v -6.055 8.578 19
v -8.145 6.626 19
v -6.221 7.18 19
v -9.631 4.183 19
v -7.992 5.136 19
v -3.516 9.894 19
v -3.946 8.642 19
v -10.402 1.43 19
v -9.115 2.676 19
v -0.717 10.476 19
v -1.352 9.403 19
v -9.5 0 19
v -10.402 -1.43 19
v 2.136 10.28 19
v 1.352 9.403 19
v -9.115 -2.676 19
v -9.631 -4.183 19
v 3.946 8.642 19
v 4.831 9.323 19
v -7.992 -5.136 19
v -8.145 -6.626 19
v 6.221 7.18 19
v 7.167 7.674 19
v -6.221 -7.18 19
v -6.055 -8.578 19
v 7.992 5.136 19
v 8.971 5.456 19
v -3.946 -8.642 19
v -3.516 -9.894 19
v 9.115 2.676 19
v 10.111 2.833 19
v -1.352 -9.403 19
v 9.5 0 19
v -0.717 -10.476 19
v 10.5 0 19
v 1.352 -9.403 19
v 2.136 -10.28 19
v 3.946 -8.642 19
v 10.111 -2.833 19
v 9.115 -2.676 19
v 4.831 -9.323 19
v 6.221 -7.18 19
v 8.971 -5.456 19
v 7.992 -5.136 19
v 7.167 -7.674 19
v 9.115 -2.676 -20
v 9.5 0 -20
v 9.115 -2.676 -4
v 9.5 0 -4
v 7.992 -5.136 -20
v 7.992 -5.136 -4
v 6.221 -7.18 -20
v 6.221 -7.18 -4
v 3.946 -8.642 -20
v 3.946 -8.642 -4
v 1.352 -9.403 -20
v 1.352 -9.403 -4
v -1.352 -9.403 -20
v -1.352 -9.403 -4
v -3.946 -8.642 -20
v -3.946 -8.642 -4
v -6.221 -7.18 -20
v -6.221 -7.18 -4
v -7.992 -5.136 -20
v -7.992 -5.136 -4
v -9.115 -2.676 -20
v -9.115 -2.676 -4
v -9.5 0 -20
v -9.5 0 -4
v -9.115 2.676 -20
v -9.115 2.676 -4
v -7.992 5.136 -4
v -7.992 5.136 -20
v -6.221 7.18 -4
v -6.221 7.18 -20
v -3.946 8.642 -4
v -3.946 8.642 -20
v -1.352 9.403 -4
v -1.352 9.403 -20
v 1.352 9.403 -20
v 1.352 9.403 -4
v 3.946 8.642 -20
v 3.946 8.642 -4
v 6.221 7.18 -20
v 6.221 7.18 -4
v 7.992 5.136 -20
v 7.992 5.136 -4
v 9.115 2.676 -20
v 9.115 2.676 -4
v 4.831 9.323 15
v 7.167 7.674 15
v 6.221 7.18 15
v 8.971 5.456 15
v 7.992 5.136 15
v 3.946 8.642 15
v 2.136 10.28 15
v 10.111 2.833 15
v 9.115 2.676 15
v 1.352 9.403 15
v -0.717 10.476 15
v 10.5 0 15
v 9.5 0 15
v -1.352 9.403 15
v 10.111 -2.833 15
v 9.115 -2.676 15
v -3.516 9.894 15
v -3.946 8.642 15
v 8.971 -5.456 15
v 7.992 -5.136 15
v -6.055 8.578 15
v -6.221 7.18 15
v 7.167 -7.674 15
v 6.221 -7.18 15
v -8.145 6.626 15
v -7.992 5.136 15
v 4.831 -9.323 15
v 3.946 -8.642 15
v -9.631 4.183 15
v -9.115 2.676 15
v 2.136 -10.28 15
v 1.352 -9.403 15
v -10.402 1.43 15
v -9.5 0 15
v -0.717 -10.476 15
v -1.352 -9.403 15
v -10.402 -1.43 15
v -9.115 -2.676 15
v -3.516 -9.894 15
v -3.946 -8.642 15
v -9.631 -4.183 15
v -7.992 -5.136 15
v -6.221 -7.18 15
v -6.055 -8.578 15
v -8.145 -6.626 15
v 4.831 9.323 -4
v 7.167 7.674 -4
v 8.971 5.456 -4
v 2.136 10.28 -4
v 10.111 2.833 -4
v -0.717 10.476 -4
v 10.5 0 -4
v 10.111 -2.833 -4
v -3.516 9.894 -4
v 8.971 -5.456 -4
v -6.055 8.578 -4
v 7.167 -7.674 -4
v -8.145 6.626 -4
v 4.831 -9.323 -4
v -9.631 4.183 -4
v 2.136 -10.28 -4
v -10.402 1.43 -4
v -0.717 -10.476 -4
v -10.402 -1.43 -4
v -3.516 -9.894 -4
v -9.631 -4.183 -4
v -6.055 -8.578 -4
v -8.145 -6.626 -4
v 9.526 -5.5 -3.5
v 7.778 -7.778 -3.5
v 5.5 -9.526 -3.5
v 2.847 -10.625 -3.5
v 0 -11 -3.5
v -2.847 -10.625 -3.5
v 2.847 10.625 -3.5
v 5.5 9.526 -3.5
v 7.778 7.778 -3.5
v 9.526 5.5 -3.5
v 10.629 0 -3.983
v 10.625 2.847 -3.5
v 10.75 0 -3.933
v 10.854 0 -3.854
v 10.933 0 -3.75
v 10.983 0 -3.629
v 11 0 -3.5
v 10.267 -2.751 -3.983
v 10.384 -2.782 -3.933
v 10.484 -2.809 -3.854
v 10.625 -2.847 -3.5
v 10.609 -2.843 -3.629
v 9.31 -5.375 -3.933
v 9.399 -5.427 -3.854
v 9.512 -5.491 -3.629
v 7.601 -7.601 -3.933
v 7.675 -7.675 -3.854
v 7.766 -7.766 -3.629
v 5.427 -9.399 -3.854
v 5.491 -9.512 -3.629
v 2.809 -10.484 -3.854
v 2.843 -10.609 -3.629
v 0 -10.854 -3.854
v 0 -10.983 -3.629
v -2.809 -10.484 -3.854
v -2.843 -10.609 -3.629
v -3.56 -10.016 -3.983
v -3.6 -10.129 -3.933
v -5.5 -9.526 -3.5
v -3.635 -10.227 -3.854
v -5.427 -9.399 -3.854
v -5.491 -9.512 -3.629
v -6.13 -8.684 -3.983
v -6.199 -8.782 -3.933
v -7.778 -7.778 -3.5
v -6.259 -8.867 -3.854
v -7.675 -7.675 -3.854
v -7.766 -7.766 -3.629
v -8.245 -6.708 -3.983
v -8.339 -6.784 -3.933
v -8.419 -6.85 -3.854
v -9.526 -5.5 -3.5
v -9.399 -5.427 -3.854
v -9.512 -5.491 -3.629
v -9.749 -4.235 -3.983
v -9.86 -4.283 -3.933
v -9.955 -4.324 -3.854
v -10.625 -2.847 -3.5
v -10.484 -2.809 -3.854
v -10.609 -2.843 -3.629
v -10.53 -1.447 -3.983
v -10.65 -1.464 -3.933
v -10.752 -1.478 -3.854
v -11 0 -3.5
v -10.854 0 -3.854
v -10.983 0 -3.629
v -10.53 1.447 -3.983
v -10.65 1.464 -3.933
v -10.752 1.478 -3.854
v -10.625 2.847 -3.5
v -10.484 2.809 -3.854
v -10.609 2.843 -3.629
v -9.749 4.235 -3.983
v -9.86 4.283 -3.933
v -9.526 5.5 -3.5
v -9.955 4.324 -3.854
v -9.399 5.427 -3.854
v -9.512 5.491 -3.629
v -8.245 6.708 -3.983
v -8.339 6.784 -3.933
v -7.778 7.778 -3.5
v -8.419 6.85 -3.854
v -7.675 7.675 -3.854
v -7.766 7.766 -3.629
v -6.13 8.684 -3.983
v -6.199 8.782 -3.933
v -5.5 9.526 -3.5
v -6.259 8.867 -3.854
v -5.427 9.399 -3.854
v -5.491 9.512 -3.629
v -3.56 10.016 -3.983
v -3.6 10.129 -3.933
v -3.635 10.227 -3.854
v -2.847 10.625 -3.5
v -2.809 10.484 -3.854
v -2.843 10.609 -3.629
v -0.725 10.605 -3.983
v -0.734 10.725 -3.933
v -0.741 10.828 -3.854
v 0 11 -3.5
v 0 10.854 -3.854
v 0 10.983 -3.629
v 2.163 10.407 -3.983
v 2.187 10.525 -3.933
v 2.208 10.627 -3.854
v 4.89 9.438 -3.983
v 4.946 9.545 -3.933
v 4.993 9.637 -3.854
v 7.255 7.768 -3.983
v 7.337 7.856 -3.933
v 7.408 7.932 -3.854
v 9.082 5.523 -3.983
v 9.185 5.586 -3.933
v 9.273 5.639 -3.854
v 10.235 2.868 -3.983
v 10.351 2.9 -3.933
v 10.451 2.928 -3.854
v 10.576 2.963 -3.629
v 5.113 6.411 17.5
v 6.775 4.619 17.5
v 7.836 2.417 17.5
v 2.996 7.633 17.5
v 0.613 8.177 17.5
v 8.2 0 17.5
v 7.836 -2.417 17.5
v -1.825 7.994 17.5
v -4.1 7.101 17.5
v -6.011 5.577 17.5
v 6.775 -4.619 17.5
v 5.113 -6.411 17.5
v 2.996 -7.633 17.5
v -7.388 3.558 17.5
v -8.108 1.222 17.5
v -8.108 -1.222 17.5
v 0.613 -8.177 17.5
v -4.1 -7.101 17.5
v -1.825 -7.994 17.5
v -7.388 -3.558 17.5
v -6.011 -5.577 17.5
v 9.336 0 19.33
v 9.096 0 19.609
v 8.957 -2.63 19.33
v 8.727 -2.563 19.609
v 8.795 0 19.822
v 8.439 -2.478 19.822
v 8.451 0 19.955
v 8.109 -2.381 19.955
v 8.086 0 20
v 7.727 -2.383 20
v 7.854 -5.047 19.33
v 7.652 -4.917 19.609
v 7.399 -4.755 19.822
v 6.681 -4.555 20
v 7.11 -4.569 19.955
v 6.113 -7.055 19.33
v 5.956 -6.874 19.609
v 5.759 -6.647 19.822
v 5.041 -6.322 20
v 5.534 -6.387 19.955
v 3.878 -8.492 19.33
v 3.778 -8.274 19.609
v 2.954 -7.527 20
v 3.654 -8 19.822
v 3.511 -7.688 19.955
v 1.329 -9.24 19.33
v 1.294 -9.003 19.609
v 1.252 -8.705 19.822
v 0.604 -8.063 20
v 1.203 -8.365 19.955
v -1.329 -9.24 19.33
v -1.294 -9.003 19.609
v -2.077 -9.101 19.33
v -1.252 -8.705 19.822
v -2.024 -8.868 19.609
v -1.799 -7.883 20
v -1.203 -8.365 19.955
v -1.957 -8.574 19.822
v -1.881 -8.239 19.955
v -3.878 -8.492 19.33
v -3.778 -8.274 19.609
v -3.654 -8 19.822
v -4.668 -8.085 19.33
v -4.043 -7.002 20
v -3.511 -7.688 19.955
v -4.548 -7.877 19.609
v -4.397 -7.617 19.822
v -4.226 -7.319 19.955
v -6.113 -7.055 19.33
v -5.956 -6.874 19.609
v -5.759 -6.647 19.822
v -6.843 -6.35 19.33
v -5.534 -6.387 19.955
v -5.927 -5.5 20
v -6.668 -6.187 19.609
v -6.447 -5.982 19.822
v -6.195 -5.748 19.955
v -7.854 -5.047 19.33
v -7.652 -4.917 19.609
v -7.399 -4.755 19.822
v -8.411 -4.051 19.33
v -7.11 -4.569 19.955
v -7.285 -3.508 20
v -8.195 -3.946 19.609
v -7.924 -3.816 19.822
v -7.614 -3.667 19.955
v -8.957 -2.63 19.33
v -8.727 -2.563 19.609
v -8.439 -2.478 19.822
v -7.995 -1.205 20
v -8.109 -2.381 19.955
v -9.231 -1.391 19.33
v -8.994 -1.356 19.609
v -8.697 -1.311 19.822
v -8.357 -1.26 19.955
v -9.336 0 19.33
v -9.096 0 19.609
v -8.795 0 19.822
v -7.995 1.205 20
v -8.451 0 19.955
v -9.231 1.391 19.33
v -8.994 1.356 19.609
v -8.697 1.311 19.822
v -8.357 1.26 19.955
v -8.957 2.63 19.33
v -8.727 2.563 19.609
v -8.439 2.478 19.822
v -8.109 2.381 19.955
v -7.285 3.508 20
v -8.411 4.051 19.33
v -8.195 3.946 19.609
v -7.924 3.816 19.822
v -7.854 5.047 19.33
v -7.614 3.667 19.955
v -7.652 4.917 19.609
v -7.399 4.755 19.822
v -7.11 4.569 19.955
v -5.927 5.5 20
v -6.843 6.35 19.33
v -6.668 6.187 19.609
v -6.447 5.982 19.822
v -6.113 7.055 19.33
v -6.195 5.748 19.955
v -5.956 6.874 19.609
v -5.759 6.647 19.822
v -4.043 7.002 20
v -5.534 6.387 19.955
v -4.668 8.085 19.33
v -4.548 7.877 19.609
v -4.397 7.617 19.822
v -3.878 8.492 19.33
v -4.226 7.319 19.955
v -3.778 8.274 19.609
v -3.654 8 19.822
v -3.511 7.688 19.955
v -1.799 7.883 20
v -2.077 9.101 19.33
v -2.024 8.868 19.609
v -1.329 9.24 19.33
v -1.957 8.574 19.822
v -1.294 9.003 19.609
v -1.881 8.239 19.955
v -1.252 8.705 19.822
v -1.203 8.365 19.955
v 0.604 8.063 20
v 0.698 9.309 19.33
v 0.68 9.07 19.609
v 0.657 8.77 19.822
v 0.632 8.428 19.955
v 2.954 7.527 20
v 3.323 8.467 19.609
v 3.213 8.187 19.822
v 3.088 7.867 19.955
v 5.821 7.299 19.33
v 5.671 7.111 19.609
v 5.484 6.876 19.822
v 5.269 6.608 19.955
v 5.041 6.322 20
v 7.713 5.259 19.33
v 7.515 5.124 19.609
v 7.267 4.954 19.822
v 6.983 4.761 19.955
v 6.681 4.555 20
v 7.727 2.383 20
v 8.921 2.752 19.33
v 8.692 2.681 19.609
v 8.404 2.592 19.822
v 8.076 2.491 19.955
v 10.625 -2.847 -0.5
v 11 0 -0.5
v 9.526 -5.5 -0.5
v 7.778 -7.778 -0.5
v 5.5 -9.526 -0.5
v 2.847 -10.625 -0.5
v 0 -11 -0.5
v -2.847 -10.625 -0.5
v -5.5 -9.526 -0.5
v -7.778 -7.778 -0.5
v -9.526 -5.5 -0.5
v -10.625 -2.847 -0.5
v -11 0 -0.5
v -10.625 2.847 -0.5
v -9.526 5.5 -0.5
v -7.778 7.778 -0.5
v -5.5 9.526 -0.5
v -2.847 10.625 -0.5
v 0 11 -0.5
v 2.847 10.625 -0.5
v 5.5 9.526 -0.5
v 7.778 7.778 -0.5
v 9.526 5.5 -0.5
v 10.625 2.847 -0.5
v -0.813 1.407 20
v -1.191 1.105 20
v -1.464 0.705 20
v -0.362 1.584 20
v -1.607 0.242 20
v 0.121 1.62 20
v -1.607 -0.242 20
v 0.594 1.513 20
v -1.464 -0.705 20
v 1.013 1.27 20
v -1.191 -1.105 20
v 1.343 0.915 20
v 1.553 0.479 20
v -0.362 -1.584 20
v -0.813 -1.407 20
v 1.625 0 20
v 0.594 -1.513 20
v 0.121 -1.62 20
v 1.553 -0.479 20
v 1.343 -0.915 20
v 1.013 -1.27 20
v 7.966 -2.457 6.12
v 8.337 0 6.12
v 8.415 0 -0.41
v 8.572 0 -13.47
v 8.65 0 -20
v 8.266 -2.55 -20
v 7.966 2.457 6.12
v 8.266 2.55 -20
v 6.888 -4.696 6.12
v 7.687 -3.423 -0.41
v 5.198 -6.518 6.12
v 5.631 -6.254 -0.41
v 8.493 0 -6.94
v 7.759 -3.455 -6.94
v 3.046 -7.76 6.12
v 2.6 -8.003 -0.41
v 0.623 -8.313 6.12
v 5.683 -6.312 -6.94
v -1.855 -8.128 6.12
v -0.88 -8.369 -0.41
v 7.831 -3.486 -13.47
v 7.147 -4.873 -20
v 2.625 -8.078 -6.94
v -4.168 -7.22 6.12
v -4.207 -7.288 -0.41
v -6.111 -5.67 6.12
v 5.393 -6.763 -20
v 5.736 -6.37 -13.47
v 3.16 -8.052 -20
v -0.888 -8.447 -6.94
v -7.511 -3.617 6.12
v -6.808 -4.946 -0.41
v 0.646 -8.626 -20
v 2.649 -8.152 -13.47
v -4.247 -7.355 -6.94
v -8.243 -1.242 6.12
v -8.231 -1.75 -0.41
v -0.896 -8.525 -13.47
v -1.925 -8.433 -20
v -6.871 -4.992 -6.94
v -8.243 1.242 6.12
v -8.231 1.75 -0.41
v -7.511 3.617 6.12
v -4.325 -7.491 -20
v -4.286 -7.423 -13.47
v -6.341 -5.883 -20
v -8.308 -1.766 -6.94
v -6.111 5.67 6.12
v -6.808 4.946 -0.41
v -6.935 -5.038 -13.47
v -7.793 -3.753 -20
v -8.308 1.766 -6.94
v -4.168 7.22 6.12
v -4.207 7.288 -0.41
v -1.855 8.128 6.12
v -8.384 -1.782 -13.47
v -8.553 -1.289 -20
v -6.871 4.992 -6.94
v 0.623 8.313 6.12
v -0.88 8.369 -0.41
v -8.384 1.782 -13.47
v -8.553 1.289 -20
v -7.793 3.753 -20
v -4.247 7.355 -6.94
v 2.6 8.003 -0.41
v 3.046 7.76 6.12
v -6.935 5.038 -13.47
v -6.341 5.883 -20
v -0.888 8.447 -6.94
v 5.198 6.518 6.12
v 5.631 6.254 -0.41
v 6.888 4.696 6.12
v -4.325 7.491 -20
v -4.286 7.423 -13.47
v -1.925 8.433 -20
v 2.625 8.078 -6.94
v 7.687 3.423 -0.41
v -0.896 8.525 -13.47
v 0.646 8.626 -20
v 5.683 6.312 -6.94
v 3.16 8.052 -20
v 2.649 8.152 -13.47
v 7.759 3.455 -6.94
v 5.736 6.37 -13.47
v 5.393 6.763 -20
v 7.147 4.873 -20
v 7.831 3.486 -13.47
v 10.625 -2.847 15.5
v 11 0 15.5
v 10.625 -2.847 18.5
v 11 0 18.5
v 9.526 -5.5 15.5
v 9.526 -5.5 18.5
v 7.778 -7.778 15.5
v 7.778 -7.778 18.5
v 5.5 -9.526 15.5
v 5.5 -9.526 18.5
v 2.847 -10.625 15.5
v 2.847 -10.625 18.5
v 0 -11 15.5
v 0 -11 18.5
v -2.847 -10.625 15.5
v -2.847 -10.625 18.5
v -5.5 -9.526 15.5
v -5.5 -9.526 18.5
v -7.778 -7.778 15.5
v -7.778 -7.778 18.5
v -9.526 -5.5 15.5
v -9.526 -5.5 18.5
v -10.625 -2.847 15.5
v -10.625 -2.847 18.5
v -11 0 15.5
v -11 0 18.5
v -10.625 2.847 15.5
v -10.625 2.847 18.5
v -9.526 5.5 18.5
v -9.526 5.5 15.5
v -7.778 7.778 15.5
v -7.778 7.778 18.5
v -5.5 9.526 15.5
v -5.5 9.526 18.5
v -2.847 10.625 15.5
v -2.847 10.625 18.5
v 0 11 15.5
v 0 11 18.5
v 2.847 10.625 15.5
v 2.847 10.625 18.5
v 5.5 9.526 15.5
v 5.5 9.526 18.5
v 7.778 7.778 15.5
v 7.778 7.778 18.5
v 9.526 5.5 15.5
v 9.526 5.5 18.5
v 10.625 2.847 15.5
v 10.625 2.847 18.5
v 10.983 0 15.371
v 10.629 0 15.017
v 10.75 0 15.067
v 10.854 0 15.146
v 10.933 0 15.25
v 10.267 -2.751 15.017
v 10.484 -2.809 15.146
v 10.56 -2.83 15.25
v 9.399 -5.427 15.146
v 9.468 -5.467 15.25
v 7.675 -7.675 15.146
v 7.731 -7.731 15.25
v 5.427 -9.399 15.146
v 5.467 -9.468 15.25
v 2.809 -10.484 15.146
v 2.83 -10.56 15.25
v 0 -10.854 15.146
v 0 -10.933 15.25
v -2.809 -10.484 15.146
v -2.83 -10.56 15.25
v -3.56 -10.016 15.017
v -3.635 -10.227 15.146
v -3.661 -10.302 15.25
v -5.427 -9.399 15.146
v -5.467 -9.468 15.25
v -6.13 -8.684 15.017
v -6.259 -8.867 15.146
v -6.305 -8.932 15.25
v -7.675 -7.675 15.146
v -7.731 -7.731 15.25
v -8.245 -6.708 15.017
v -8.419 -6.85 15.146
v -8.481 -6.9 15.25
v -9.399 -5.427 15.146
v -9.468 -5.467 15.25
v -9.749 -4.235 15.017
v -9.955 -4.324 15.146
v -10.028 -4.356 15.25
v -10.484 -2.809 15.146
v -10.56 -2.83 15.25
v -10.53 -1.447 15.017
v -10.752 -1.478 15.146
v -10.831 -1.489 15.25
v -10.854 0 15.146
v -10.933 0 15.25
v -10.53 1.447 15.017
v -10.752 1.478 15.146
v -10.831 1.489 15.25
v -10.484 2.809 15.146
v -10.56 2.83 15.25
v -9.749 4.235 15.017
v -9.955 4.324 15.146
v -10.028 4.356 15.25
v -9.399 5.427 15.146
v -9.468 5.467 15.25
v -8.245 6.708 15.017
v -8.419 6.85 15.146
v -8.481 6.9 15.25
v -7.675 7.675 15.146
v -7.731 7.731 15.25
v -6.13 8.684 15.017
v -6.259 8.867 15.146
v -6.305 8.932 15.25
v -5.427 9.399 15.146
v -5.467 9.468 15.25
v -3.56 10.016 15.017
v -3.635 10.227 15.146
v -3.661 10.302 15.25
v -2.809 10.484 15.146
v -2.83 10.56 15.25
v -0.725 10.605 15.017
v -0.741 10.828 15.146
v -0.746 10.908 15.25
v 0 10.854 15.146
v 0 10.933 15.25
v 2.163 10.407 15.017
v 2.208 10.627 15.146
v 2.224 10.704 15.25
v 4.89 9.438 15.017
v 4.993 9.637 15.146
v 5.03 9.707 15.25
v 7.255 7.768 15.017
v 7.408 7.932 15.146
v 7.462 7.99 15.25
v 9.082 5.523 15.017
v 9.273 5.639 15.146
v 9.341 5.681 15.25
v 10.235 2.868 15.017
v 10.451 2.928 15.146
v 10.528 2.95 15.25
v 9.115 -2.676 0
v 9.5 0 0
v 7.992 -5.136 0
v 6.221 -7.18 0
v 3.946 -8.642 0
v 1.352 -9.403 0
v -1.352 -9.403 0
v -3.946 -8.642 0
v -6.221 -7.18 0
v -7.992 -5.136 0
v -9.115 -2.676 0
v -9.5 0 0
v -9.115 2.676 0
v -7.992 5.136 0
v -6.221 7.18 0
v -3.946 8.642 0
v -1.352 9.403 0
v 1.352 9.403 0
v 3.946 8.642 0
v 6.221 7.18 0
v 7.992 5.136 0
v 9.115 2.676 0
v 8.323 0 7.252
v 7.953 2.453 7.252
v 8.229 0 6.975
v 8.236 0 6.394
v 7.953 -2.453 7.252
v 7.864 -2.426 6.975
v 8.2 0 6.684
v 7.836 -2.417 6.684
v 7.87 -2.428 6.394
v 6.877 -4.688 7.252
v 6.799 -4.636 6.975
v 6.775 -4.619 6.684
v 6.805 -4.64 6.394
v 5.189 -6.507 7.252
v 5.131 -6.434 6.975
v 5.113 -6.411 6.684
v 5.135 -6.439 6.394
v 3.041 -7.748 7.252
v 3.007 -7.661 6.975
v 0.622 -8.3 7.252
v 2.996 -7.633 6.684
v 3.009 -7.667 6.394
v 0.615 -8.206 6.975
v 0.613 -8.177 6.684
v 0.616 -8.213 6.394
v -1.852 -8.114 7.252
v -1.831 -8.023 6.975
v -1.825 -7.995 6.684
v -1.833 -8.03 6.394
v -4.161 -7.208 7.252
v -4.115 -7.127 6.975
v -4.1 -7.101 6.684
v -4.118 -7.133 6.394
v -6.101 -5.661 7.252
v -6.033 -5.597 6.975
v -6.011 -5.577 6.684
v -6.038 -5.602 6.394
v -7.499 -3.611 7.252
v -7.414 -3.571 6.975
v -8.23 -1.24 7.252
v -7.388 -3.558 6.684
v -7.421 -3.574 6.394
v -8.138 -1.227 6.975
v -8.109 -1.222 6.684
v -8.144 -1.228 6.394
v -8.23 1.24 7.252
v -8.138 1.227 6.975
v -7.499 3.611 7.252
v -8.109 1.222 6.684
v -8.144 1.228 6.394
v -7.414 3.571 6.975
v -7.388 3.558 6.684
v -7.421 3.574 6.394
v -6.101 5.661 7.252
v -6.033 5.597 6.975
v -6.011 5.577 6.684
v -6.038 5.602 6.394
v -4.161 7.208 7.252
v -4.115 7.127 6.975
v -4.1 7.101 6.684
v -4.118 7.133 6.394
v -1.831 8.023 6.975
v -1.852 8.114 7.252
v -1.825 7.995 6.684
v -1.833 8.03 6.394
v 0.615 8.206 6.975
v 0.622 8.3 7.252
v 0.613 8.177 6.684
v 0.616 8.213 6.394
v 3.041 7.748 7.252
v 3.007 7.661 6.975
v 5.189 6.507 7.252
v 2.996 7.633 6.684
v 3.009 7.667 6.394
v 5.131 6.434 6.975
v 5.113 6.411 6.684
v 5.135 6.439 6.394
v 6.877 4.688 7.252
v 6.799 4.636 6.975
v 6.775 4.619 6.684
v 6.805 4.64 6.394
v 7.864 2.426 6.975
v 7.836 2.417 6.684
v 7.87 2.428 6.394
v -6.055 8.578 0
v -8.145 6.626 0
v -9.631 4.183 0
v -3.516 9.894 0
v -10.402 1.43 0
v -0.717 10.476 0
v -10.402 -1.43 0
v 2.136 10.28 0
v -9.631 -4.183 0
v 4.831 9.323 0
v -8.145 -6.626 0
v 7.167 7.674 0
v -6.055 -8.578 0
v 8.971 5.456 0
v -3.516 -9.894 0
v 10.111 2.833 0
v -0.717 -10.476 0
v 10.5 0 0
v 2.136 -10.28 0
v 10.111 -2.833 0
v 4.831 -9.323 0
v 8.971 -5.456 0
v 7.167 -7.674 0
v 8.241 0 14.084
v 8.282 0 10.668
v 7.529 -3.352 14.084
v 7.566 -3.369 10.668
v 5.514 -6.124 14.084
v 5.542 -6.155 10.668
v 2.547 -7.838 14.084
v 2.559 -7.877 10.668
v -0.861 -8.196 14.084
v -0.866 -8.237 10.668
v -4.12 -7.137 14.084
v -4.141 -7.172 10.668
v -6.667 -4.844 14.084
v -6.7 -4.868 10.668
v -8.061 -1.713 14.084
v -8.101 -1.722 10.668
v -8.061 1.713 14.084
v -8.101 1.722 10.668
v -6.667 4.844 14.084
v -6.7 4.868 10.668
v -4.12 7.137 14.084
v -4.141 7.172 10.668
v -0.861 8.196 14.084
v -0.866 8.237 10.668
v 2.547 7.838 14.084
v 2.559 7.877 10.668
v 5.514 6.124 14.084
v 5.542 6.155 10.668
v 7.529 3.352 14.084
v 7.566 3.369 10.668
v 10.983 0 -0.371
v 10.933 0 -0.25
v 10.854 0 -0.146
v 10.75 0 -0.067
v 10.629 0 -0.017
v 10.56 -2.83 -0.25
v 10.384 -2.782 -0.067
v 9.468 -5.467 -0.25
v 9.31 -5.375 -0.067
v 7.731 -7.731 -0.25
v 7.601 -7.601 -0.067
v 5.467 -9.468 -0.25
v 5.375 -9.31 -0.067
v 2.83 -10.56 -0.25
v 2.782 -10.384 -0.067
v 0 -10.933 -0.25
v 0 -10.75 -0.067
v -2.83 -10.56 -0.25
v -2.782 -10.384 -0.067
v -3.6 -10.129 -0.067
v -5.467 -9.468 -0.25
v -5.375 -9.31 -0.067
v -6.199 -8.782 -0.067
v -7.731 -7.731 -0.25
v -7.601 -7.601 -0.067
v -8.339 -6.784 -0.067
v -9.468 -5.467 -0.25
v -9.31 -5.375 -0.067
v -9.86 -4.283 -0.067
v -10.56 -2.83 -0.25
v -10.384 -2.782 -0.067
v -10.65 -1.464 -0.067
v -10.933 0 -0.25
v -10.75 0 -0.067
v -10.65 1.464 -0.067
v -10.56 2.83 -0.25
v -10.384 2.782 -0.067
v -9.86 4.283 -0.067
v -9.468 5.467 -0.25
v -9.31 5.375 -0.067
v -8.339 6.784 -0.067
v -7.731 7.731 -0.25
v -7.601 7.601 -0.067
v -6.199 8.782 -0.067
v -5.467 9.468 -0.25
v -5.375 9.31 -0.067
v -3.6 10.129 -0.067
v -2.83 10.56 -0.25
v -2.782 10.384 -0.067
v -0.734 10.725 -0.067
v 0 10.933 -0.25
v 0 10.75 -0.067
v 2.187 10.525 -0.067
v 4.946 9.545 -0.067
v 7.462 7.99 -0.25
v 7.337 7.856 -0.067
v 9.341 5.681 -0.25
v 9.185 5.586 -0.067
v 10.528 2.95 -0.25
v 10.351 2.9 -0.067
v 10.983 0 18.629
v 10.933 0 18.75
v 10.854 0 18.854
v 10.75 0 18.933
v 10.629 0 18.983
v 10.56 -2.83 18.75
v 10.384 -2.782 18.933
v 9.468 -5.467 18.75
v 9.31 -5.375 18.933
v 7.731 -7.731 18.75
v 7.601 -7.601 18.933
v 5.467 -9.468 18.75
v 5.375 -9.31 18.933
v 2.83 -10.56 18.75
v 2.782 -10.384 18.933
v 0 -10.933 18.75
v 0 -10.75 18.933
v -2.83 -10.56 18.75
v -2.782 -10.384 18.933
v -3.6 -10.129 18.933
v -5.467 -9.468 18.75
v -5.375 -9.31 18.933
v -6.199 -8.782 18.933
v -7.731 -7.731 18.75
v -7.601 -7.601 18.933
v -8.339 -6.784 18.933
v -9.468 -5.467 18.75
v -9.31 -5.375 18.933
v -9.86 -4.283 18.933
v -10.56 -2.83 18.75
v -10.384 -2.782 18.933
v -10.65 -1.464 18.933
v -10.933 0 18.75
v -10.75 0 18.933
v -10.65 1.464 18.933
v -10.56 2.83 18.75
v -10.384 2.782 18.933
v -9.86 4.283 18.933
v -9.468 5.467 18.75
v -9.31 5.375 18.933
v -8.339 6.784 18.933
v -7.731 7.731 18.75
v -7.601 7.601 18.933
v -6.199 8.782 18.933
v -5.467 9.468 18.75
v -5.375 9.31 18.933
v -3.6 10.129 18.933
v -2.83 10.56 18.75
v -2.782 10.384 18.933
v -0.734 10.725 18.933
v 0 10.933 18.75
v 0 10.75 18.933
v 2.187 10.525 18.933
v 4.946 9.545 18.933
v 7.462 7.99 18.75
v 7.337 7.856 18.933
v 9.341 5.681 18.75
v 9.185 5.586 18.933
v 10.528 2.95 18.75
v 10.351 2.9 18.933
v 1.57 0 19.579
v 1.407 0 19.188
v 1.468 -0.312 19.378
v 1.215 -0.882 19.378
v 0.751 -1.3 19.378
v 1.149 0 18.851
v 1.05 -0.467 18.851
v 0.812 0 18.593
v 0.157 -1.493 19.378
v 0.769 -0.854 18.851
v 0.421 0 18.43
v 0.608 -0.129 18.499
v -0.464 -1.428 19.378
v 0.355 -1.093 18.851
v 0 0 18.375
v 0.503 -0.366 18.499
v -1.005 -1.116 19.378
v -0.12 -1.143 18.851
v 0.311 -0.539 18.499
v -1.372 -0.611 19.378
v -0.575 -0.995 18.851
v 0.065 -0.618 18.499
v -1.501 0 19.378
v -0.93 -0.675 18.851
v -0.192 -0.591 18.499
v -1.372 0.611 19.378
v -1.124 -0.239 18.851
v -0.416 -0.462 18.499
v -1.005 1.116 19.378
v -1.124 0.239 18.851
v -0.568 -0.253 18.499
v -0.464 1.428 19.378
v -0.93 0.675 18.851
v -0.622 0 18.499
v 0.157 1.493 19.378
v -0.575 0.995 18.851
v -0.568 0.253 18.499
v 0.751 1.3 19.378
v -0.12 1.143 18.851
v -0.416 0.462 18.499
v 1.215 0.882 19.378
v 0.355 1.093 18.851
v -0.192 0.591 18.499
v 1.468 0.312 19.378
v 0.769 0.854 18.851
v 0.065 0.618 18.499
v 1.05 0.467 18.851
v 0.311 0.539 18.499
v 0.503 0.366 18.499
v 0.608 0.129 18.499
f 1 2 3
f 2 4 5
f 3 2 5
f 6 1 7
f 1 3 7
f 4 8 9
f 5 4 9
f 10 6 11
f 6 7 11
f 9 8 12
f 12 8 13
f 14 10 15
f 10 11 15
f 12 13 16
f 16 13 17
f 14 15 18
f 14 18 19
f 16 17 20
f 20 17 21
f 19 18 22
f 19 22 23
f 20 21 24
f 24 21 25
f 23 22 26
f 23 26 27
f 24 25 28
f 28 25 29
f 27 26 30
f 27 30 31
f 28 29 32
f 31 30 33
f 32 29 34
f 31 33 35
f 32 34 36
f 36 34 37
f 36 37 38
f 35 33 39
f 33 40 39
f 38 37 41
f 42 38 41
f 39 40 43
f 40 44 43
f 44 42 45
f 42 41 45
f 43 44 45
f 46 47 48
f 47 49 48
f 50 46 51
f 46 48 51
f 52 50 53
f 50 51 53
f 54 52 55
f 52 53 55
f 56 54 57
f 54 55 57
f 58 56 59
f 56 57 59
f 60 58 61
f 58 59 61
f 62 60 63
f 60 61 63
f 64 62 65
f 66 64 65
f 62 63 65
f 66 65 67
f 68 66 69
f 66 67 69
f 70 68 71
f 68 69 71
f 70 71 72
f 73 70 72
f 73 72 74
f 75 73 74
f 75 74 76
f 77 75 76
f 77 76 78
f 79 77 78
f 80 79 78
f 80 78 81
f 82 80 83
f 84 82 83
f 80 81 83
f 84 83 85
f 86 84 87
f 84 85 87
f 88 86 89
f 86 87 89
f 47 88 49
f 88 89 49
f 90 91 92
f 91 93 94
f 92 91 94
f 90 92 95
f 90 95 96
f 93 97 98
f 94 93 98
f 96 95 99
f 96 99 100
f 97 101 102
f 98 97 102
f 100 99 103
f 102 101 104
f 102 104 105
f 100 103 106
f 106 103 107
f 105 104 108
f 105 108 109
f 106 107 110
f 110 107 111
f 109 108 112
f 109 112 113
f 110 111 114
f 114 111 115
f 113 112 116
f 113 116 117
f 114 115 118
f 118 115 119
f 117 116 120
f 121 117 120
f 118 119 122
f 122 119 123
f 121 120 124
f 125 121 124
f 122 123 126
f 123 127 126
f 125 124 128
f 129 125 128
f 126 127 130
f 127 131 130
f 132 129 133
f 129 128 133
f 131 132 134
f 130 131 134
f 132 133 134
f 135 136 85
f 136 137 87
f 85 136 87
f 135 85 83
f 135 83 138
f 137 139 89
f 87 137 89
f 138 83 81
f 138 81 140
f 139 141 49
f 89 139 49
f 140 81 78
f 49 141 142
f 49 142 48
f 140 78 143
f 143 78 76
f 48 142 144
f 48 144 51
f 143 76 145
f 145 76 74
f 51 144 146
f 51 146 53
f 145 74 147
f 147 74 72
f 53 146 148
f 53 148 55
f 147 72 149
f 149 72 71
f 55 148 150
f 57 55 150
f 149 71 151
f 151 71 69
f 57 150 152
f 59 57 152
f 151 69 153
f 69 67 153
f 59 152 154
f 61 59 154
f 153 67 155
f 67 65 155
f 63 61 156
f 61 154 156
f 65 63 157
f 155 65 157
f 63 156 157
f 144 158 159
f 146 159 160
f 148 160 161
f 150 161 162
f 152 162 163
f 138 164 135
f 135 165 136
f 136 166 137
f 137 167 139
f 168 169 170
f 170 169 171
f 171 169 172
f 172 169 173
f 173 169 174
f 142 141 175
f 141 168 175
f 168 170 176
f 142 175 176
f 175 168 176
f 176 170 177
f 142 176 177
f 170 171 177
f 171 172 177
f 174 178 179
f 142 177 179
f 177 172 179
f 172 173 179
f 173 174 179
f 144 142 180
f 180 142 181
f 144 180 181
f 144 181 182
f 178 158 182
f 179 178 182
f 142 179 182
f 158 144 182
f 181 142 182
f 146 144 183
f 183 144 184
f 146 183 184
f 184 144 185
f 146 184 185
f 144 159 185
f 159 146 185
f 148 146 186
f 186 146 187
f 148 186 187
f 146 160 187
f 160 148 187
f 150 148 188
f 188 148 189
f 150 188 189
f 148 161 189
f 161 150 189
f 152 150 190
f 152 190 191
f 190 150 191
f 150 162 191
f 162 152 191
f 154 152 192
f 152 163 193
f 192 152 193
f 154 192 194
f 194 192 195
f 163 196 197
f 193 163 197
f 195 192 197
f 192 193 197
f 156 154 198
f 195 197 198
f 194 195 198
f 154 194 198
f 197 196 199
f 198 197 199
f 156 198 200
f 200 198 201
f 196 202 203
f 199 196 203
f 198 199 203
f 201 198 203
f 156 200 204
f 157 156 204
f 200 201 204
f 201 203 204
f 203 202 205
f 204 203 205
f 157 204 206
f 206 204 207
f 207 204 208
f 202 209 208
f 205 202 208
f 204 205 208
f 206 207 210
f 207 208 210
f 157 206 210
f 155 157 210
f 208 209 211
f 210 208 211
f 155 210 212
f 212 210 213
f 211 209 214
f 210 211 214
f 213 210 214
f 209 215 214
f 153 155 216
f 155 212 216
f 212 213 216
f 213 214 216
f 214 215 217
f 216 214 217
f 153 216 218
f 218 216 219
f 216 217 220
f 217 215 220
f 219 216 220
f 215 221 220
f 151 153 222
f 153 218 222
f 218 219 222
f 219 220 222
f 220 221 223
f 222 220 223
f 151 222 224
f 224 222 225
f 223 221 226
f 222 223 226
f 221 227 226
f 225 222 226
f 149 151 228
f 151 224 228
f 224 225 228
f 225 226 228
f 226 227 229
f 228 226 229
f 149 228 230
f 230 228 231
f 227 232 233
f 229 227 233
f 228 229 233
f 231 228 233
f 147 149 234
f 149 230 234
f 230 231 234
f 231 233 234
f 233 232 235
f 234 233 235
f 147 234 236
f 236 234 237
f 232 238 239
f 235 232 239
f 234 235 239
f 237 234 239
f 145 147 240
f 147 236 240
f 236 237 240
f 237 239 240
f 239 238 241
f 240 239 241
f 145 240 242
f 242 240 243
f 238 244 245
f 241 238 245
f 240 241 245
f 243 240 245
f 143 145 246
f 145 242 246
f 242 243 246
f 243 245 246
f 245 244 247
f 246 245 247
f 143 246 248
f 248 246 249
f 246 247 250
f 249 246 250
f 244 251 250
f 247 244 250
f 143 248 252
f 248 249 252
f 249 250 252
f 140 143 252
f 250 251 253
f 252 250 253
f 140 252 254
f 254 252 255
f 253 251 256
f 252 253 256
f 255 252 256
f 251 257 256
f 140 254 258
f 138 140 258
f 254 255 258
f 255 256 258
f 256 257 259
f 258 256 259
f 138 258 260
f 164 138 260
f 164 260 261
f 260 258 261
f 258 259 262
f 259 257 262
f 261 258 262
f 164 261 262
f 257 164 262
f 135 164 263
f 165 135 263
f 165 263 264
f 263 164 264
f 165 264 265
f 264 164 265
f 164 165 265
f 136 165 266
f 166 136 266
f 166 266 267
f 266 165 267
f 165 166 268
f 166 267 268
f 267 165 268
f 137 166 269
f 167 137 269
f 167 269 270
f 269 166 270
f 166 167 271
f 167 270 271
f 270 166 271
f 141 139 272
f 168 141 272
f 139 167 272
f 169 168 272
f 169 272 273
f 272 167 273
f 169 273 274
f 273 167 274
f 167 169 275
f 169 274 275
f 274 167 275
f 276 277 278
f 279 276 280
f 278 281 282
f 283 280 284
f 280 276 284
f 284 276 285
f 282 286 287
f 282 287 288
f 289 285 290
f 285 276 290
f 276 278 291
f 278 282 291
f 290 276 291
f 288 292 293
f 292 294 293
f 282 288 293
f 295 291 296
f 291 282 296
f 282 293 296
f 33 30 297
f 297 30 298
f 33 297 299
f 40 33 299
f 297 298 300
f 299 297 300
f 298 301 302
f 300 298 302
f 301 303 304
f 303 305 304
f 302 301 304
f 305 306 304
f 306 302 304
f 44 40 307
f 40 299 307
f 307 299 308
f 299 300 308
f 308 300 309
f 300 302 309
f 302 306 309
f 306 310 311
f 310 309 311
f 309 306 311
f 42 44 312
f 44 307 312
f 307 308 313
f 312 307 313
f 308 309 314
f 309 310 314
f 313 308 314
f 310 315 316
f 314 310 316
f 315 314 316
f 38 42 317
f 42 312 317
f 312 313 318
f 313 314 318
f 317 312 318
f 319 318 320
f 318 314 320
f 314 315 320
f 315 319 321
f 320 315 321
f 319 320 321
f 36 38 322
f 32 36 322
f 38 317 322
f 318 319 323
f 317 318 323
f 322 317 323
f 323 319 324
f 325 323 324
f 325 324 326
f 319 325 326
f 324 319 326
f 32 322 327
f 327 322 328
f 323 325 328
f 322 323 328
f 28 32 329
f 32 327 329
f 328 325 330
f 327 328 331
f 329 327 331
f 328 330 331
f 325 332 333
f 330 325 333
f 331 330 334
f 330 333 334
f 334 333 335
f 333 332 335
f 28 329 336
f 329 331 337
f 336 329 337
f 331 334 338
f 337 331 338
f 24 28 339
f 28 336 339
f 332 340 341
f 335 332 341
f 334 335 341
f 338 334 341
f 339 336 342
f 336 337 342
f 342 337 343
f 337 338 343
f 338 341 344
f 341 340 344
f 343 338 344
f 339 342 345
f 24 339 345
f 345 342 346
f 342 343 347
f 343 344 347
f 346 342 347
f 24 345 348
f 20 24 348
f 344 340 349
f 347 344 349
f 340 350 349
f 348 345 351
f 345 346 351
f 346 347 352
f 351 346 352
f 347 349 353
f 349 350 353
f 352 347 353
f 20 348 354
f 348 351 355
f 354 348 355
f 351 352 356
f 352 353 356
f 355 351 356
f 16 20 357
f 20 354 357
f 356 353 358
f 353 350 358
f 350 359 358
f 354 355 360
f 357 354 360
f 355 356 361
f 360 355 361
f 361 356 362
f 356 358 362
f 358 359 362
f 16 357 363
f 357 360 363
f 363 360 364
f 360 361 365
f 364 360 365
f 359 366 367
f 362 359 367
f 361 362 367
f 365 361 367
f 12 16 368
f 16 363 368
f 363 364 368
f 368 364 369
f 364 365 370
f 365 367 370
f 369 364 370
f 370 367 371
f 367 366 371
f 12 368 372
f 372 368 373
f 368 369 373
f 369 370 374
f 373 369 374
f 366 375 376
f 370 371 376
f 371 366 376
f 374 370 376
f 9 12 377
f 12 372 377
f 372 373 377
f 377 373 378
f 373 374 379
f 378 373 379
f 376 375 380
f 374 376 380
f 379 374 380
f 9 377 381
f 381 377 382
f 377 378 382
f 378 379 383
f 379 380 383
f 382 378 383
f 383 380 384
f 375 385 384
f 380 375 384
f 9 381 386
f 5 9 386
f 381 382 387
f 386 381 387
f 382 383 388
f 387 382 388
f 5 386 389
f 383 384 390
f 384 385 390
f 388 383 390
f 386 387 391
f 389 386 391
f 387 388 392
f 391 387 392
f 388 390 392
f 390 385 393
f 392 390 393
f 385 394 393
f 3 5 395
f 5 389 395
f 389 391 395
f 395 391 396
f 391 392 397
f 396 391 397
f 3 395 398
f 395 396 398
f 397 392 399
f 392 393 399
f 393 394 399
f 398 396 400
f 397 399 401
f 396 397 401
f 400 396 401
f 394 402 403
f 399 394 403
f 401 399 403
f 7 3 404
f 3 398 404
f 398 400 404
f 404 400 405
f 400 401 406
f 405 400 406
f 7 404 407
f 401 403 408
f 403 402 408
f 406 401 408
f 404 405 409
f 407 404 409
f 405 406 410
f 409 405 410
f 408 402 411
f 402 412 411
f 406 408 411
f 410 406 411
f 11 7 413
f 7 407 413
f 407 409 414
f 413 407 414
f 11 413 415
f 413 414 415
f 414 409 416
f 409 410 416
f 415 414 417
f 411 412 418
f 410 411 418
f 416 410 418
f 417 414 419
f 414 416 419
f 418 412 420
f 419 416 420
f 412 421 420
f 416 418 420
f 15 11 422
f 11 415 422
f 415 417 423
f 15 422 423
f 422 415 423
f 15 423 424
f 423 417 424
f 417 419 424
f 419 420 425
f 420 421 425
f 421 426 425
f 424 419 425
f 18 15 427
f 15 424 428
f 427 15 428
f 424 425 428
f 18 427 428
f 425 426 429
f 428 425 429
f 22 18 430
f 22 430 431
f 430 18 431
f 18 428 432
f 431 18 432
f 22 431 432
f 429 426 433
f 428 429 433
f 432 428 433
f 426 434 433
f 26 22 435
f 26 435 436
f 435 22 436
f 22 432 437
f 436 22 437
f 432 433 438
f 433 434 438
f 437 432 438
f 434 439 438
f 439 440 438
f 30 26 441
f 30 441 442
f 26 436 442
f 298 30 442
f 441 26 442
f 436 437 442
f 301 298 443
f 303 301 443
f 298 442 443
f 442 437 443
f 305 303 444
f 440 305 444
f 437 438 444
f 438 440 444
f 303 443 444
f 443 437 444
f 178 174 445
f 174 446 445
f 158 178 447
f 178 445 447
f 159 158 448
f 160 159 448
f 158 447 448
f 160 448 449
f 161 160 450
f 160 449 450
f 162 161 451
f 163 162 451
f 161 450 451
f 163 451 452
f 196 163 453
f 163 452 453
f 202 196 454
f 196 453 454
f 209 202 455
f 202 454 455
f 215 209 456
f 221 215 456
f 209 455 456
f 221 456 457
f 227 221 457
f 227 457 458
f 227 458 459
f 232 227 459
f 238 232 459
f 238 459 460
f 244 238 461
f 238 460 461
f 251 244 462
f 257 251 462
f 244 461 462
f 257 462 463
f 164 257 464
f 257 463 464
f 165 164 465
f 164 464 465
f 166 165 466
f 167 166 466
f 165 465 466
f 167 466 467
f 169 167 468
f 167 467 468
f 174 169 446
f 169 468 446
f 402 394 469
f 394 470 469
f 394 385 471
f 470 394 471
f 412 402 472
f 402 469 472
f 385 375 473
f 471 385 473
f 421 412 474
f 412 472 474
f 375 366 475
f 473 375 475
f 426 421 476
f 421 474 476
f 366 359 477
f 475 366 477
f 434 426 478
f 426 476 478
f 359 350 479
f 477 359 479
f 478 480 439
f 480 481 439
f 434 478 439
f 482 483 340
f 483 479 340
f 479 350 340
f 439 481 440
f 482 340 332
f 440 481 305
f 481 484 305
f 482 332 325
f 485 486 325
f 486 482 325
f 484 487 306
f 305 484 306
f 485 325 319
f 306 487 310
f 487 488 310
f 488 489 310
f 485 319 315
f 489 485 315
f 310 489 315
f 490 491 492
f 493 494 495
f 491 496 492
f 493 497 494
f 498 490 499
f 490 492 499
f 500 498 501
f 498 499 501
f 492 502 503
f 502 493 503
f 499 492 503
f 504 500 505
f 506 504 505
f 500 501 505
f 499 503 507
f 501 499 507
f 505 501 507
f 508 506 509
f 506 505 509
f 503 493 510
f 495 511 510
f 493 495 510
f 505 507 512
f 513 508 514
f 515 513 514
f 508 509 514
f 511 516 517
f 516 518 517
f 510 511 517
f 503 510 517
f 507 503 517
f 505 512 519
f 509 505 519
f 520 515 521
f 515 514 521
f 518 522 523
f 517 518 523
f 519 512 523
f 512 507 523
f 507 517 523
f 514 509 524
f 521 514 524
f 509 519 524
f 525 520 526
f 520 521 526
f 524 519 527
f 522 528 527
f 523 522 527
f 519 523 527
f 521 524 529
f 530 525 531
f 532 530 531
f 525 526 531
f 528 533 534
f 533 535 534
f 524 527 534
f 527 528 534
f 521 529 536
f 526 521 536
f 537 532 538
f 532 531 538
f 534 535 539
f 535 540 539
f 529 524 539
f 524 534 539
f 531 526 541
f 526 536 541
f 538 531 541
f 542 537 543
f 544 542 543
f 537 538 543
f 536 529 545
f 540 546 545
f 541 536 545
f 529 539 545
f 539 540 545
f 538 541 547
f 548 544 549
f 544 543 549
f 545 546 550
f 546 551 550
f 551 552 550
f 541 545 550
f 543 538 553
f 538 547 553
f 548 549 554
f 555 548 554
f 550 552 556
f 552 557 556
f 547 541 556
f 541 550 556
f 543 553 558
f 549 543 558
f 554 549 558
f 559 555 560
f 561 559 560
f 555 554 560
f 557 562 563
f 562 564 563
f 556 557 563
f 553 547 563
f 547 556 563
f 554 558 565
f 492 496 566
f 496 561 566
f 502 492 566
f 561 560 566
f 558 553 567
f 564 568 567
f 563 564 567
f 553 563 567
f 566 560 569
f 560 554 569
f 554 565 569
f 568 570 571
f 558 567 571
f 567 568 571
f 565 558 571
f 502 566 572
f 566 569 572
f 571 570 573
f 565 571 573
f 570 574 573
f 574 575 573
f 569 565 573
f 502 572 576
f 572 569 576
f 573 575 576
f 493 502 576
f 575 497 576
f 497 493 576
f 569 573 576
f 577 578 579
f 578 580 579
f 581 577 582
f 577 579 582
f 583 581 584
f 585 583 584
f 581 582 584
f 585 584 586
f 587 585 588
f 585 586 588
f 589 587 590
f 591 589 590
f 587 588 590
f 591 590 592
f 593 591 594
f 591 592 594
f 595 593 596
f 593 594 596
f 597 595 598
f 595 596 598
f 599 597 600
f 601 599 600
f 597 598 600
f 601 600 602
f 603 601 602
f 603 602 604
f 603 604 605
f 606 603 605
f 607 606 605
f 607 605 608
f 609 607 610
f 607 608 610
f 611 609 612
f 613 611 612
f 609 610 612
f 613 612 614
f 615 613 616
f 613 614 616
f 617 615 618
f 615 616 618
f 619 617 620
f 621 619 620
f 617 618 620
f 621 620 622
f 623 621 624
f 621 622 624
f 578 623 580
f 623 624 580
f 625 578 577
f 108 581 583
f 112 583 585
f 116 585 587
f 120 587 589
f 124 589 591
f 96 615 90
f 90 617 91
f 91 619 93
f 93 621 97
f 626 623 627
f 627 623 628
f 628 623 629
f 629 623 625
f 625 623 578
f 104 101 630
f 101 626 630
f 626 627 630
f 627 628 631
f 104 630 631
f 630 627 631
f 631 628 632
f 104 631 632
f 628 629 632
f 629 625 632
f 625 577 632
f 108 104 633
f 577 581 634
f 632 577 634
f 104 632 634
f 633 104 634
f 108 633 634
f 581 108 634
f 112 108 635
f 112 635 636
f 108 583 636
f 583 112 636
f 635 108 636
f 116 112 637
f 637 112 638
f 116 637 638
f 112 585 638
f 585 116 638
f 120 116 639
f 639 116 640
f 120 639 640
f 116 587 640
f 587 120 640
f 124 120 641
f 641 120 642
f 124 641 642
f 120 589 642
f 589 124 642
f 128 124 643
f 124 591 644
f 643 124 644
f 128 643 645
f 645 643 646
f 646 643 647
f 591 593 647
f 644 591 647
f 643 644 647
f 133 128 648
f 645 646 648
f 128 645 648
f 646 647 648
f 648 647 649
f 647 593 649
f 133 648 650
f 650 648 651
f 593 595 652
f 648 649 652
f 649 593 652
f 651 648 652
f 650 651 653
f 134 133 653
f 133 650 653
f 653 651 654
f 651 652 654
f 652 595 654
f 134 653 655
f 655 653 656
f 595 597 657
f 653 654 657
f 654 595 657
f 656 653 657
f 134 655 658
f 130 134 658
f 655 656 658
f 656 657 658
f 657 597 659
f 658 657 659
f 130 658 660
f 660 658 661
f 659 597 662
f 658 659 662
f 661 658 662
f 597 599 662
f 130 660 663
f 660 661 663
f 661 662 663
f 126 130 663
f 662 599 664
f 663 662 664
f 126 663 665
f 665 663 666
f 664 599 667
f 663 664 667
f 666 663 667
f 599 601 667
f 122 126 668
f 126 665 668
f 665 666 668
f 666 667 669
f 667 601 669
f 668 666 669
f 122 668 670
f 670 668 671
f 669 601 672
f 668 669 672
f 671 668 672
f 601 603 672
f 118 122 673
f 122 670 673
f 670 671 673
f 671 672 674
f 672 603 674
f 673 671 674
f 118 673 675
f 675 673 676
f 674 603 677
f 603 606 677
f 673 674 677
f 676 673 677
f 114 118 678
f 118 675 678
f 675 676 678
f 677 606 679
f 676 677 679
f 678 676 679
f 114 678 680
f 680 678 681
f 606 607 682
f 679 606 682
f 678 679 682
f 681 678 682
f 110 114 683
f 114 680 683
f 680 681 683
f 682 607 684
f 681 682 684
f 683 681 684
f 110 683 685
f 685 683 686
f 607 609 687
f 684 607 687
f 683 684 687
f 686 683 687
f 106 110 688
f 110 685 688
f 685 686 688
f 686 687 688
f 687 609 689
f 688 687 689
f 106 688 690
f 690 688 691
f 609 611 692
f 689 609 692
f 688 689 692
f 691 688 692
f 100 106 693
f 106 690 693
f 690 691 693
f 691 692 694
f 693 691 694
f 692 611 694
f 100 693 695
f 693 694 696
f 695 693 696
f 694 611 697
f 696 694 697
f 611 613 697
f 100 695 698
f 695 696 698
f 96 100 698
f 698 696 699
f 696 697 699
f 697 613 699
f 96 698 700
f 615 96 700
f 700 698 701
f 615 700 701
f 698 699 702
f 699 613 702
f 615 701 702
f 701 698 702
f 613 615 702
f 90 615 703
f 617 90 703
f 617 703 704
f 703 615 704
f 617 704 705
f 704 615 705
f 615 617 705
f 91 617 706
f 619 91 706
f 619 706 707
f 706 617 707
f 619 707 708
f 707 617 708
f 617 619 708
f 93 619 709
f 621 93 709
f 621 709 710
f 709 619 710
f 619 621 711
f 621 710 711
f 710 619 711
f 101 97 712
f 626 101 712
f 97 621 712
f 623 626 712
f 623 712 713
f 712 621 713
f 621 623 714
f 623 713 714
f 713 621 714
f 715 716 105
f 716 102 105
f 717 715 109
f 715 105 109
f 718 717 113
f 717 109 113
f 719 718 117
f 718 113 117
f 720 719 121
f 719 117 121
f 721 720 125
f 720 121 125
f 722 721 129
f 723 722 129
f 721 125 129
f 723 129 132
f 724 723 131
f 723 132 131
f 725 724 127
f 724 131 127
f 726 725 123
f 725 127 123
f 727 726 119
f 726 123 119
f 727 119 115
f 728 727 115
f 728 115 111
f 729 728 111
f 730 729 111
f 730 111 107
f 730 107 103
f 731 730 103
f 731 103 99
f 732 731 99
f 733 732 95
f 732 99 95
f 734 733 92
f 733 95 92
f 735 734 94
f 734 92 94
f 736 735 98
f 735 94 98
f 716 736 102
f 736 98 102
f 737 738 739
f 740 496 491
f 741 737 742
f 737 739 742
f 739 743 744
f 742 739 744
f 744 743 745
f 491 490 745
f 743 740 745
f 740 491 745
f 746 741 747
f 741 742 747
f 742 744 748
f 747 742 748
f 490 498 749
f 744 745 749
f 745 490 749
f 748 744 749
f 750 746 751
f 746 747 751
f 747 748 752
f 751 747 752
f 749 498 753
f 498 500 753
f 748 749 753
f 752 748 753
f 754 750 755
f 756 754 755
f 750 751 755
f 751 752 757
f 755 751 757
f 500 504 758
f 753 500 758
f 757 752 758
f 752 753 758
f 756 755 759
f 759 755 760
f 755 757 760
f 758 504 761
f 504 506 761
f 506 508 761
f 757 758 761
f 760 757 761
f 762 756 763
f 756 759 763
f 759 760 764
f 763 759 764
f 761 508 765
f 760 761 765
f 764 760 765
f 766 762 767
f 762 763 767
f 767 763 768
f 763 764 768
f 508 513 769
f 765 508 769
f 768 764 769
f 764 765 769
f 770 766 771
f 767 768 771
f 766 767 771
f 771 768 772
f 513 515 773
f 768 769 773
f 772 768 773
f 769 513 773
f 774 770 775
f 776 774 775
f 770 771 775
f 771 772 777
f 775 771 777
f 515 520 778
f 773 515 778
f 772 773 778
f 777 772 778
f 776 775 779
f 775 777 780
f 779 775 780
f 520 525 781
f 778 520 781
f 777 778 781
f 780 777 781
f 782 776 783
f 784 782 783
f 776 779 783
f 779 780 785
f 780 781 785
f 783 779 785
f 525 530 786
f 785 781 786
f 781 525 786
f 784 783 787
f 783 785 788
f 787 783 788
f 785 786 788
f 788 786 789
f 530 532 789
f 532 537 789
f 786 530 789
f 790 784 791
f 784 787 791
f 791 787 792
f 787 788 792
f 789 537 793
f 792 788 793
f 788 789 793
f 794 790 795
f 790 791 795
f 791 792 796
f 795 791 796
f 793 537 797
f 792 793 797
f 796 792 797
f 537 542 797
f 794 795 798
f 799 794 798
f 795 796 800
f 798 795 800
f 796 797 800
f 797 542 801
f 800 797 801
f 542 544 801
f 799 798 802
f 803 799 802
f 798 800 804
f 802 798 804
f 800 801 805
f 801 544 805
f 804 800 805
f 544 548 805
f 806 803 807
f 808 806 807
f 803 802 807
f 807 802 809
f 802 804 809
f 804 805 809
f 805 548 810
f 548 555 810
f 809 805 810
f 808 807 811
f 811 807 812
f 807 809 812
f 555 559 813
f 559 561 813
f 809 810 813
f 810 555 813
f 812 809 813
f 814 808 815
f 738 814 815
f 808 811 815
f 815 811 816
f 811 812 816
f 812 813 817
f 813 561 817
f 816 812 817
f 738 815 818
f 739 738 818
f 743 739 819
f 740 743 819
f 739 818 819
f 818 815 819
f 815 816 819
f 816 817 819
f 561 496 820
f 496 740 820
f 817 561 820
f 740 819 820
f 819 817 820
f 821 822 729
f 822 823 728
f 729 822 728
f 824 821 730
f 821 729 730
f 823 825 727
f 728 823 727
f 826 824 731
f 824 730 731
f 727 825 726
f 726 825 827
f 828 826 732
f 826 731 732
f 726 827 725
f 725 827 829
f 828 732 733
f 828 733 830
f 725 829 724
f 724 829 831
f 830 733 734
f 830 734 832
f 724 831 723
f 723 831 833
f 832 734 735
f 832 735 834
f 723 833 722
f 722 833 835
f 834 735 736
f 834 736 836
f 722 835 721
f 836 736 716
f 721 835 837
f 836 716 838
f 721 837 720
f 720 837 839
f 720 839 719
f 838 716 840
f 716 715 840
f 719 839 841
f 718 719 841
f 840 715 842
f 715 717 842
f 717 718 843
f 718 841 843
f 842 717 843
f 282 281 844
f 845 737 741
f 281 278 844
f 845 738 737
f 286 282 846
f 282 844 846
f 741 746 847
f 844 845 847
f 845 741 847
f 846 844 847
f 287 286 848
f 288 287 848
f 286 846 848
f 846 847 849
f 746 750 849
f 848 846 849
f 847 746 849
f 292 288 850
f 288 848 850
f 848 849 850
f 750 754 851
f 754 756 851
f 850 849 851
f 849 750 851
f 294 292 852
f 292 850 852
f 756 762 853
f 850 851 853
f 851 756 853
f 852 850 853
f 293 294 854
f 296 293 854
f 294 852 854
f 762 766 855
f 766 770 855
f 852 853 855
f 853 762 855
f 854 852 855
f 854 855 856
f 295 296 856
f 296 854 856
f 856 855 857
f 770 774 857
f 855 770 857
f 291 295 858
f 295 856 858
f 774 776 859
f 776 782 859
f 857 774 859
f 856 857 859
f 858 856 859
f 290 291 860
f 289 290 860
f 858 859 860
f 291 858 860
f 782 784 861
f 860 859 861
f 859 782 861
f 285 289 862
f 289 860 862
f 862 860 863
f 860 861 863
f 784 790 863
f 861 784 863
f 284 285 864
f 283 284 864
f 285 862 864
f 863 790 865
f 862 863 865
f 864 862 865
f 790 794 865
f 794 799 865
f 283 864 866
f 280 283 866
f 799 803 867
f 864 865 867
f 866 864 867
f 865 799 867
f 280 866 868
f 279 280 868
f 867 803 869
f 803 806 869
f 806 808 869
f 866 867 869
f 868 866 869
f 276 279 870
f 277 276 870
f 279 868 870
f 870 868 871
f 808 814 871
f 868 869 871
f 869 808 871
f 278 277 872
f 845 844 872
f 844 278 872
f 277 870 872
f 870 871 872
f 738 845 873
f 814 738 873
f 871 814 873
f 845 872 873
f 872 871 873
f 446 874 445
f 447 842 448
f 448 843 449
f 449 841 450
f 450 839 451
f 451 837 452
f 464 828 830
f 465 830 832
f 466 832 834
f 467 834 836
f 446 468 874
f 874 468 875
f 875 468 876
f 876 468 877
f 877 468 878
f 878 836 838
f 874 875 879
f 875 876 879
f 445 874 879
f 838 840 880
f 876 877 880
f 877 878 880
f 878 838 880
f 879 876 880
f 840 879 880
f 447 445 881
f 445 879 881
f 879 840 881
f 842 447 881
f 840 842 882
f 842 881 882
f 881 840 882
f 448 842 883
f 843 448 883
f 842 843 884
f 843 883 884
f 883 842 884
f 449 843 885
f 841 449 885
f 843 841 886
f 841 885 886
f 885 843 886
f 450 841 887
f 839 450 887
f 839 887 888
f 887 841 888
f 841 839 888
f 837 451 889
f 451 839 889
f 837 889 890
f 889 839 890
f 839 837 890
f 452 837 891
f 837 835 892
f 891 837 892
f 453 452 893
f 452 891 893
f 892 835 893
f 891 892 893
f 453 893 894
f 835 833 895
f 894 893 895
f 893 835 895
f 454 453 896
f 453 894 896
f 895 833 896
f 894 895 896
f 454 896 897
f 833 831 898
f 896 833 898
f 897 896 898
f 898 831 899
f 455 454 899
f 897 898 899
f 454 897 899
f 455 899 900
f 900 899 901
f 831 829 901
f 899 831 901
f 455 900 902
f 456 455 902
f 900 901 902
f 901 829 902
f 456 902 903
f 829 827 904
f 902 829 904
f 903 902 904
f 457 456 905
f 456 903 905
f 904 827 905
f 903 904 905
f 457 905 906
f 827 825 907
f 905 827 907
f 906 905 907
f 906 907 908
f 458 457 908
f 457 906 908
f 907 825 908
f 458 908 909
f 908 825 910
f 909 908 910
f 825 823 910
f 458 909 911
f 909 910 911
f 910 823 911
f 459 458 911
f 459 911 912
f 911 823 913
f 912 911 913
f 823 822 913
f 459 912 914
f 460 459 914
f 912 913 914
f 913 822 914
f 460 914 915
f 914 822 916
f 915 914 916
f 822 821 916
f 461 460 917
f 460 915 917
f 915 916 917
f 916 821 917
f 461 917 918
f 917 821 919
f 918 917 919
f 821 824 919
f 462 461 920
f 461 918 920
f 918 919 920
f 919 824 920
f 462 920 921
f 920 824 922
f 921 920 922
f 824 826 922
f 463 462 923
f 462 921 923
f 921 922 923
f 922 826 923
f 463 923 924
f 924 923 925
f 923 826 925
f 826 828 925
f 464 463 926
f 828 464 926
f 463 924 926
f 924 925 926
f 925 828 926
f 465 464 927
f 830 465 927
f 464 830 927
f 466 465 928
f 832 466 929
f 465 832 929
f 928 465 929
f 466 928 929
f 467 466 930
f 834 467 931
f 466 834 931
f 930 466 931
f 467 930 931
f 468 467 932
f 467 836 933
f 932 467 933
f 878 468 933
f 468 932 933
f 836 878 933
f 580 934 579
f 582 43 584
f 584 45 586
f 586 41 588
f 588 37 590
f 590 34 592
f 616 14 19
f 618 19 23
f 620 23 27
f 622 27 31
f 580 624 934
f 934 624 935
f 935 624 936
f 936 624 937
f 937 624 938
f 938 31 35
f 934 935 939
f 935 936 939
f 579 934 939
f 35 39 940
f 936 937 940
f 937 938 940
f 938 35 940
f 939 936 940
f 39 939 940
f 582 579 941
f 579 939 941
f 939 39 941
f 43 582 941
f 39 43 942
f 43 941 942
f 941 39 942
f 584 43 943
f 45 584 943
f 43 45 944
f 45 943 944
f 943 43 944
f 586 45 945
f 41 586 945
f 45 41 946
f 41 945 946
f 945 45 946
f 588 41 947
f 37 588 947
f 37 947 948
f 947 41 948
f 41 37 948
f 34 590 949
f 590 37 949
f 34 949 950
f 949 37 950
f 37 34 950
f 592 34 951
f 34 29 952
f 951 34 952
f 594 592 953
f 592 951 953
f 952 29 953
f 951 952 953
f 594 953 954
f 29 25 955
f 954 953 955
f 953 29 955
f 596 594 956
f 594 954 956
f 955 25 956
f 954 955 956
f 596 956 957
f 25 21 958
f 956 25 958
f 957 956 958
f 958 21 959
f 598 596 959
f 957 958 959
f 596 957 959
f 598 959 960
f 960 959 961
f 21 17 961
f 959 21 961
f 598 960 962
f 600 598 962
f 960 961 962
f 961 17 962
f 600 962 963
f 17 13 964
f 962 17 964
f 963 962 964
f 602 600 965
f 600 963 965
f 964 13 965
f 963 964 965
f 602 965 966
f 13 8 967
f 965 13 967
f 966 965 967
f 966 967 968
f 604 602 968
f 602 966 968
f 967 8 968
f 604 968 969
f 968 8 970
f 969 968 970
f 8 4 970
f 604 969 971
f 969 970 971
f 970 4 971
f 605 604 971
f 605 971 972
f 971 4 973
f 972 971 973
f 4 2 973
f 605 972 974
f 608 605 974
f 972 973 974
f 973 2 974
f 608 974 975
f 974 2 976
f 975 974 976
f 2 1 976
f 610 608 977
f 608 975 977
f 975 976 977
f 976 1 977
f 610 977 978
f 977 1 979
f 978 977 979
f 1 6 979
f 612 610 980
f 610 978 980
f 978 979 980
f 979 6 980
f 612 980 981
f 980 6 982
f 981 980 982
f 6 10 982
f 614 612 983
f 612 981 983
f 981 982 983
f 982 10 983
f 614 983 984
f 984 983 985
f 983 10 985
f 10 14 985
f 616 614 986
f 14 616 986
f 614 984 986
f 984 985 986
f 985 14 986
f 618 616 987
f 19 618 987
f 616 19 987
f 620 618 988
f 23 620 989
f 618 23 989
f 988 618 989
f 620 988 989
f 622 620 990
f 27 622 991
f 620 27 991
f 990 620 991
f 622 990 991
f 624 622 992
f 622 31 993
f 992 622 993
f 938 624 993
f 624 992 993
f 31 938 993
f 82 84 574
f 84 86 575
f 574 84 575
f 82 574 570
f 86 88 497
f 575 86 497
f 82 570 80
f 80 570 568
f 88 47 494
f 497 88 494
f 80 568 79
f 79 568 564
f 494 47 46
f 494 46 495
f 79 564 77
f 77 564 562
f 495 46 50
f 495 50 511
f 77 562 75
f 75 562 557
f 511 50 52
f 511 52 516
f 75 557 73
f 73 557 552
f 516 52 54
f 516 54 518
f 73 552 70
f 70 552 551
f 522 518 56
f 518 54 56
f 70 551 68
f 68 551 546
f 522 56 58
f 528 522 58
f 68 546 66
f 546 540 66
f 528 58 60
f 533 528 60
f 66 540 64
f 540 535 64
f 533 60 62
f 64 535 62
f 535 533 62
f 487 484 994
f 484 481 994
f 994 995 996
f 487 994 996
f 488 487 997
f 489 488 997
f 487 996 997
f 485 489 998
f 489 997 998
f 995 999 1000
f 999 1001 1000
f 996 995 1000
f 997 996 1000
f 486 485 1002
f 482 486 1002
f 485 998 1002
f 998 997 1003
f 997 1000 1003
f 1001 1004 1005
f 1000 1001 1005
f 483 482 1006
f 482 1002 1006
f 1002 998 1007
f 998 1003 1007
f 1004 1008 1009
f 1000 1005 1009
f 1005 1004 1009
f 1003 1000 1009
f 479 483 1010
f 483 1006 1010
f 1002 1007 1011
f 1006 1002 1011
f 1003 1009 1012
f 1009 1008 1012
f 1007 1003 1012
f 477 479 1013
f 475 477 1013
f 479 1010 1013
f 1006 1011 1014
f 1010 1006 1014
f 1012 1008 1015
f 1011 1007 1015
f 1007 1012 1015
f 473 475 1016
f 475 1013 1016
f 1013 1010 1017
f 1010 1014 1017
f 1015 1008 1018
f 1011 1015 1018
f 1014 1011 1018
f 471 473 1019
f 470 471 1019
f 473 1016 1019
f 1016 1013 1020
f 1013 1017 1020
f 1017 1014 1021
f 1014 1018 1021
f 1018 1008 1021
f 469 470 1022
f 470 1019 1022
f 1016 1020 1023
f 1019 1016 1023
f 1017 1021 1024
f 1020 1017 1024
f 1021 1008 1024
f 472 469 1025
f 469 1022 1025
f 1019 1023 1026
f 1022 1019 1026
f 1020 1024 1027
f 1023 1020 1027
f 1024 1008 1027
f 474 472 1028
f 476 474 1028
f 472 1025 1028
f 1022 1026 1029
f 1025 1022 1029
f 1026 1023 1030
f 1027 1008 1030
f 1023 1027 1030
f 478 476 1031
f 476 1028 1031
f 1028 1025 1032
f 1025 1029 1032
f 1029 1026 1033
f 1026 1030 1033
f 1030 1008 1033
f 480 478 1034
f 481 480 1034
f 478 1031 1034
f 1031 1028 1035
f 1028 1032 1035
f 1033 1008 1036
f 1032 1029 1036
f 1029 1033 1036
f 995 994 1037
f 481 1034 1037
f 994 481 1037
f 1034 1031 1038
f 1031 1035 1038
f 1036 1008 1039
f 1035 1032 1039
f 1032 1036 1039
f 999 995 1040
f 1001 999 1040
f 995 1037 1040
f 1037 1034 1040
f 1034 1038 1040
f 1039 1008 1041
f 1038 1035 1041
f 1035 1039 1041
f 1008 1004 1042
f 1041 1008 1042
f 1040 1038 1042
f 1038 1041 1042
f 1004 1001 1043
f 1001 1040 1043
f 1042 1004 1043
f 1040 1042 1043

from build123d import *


# Not quite as in the source:
# - a fillet or chamfer that OpenCascade refuses, or shapes differently, is made with other operations: its cross-section is extruded or revolved along the edge and cut away or added


with BuildPart() as f1:
    # F0 (on Front) → F1 (revolve)
    with BuildSketch(Plane.XZ):
        with BuildLine():
            Line((9.5, 20), (1.625, 20))
            ThreePointArc((1.625, 20), (1.1490485194, 18.8509514806), (0, 18.375))
            Line((0, 18.375), (0, 17.5))
            Line((0, 17.5), (8.2, 17.5))
            Line((8.2, 17.5), (8.3229769486, 7.2519209513))
            ThreePointArc((8.3229769486, 7.2519209513), (8.2000935899, 6.6844011231), (8.3365600781, 6.1199934931))
            Line((8.3365600781, 6.1199934931), (8.65, -20))
            Line((8.65, -20), (9.5, -20))
            Line((9.5, -20), (9.5, -4))
            Line((9.5, -4), (10.5, -4))
            ThreePointArc((10.5, -4), (10.8535533906, -3.8535533906), (11, -3.5))
            Line((11, -3.5), (11, -0.5))
            ThreePointArc((11, -0.5), (10.8535533906, -0.1464466094), (10.5, 0))
            Line((10.5, 0), (9.5, 0))
            Line((9.5, 0), (9.5, 15))
            Line((9.5, 15), (10.5, 15))
            ThreePointArc((10.5, 15), (10.8535533906, 15.1464466094), (11, 15.5))
            Line((11, 15.5), (11, 18.5))
            ThreePointArc((11, 18.5), (10.8535533906, 18.8535533906), (10.5, 19))
            Line((10.5, 19), (9.5, 19))
            Line((9.5, 19), (9.5, 20))
        make_face()
    revolve(axis=Axis((0, 0, 0), (0, 0, -1)))

    # F2: fillet of radius 1.5 on 1 edges, made by hand

    # F2_s1 → F2_t2 (revolve, cut)
    with BuildSketch(Plane.XZ):
        with BuildLine():
            ThreePointArc((9.5, 19), (8.9518118414, 19.7247448714), (8.0857864376, 20))
            Line((8.0857864376, 20), (9.5, 20))
            Line((9.5, 20), (9.5, 19))
        make_face()
    revolve(axis=Axis((0, 0, 20), (0, 0, -1)), mode=Mode.SUBTRACT)


solid = f1.part
